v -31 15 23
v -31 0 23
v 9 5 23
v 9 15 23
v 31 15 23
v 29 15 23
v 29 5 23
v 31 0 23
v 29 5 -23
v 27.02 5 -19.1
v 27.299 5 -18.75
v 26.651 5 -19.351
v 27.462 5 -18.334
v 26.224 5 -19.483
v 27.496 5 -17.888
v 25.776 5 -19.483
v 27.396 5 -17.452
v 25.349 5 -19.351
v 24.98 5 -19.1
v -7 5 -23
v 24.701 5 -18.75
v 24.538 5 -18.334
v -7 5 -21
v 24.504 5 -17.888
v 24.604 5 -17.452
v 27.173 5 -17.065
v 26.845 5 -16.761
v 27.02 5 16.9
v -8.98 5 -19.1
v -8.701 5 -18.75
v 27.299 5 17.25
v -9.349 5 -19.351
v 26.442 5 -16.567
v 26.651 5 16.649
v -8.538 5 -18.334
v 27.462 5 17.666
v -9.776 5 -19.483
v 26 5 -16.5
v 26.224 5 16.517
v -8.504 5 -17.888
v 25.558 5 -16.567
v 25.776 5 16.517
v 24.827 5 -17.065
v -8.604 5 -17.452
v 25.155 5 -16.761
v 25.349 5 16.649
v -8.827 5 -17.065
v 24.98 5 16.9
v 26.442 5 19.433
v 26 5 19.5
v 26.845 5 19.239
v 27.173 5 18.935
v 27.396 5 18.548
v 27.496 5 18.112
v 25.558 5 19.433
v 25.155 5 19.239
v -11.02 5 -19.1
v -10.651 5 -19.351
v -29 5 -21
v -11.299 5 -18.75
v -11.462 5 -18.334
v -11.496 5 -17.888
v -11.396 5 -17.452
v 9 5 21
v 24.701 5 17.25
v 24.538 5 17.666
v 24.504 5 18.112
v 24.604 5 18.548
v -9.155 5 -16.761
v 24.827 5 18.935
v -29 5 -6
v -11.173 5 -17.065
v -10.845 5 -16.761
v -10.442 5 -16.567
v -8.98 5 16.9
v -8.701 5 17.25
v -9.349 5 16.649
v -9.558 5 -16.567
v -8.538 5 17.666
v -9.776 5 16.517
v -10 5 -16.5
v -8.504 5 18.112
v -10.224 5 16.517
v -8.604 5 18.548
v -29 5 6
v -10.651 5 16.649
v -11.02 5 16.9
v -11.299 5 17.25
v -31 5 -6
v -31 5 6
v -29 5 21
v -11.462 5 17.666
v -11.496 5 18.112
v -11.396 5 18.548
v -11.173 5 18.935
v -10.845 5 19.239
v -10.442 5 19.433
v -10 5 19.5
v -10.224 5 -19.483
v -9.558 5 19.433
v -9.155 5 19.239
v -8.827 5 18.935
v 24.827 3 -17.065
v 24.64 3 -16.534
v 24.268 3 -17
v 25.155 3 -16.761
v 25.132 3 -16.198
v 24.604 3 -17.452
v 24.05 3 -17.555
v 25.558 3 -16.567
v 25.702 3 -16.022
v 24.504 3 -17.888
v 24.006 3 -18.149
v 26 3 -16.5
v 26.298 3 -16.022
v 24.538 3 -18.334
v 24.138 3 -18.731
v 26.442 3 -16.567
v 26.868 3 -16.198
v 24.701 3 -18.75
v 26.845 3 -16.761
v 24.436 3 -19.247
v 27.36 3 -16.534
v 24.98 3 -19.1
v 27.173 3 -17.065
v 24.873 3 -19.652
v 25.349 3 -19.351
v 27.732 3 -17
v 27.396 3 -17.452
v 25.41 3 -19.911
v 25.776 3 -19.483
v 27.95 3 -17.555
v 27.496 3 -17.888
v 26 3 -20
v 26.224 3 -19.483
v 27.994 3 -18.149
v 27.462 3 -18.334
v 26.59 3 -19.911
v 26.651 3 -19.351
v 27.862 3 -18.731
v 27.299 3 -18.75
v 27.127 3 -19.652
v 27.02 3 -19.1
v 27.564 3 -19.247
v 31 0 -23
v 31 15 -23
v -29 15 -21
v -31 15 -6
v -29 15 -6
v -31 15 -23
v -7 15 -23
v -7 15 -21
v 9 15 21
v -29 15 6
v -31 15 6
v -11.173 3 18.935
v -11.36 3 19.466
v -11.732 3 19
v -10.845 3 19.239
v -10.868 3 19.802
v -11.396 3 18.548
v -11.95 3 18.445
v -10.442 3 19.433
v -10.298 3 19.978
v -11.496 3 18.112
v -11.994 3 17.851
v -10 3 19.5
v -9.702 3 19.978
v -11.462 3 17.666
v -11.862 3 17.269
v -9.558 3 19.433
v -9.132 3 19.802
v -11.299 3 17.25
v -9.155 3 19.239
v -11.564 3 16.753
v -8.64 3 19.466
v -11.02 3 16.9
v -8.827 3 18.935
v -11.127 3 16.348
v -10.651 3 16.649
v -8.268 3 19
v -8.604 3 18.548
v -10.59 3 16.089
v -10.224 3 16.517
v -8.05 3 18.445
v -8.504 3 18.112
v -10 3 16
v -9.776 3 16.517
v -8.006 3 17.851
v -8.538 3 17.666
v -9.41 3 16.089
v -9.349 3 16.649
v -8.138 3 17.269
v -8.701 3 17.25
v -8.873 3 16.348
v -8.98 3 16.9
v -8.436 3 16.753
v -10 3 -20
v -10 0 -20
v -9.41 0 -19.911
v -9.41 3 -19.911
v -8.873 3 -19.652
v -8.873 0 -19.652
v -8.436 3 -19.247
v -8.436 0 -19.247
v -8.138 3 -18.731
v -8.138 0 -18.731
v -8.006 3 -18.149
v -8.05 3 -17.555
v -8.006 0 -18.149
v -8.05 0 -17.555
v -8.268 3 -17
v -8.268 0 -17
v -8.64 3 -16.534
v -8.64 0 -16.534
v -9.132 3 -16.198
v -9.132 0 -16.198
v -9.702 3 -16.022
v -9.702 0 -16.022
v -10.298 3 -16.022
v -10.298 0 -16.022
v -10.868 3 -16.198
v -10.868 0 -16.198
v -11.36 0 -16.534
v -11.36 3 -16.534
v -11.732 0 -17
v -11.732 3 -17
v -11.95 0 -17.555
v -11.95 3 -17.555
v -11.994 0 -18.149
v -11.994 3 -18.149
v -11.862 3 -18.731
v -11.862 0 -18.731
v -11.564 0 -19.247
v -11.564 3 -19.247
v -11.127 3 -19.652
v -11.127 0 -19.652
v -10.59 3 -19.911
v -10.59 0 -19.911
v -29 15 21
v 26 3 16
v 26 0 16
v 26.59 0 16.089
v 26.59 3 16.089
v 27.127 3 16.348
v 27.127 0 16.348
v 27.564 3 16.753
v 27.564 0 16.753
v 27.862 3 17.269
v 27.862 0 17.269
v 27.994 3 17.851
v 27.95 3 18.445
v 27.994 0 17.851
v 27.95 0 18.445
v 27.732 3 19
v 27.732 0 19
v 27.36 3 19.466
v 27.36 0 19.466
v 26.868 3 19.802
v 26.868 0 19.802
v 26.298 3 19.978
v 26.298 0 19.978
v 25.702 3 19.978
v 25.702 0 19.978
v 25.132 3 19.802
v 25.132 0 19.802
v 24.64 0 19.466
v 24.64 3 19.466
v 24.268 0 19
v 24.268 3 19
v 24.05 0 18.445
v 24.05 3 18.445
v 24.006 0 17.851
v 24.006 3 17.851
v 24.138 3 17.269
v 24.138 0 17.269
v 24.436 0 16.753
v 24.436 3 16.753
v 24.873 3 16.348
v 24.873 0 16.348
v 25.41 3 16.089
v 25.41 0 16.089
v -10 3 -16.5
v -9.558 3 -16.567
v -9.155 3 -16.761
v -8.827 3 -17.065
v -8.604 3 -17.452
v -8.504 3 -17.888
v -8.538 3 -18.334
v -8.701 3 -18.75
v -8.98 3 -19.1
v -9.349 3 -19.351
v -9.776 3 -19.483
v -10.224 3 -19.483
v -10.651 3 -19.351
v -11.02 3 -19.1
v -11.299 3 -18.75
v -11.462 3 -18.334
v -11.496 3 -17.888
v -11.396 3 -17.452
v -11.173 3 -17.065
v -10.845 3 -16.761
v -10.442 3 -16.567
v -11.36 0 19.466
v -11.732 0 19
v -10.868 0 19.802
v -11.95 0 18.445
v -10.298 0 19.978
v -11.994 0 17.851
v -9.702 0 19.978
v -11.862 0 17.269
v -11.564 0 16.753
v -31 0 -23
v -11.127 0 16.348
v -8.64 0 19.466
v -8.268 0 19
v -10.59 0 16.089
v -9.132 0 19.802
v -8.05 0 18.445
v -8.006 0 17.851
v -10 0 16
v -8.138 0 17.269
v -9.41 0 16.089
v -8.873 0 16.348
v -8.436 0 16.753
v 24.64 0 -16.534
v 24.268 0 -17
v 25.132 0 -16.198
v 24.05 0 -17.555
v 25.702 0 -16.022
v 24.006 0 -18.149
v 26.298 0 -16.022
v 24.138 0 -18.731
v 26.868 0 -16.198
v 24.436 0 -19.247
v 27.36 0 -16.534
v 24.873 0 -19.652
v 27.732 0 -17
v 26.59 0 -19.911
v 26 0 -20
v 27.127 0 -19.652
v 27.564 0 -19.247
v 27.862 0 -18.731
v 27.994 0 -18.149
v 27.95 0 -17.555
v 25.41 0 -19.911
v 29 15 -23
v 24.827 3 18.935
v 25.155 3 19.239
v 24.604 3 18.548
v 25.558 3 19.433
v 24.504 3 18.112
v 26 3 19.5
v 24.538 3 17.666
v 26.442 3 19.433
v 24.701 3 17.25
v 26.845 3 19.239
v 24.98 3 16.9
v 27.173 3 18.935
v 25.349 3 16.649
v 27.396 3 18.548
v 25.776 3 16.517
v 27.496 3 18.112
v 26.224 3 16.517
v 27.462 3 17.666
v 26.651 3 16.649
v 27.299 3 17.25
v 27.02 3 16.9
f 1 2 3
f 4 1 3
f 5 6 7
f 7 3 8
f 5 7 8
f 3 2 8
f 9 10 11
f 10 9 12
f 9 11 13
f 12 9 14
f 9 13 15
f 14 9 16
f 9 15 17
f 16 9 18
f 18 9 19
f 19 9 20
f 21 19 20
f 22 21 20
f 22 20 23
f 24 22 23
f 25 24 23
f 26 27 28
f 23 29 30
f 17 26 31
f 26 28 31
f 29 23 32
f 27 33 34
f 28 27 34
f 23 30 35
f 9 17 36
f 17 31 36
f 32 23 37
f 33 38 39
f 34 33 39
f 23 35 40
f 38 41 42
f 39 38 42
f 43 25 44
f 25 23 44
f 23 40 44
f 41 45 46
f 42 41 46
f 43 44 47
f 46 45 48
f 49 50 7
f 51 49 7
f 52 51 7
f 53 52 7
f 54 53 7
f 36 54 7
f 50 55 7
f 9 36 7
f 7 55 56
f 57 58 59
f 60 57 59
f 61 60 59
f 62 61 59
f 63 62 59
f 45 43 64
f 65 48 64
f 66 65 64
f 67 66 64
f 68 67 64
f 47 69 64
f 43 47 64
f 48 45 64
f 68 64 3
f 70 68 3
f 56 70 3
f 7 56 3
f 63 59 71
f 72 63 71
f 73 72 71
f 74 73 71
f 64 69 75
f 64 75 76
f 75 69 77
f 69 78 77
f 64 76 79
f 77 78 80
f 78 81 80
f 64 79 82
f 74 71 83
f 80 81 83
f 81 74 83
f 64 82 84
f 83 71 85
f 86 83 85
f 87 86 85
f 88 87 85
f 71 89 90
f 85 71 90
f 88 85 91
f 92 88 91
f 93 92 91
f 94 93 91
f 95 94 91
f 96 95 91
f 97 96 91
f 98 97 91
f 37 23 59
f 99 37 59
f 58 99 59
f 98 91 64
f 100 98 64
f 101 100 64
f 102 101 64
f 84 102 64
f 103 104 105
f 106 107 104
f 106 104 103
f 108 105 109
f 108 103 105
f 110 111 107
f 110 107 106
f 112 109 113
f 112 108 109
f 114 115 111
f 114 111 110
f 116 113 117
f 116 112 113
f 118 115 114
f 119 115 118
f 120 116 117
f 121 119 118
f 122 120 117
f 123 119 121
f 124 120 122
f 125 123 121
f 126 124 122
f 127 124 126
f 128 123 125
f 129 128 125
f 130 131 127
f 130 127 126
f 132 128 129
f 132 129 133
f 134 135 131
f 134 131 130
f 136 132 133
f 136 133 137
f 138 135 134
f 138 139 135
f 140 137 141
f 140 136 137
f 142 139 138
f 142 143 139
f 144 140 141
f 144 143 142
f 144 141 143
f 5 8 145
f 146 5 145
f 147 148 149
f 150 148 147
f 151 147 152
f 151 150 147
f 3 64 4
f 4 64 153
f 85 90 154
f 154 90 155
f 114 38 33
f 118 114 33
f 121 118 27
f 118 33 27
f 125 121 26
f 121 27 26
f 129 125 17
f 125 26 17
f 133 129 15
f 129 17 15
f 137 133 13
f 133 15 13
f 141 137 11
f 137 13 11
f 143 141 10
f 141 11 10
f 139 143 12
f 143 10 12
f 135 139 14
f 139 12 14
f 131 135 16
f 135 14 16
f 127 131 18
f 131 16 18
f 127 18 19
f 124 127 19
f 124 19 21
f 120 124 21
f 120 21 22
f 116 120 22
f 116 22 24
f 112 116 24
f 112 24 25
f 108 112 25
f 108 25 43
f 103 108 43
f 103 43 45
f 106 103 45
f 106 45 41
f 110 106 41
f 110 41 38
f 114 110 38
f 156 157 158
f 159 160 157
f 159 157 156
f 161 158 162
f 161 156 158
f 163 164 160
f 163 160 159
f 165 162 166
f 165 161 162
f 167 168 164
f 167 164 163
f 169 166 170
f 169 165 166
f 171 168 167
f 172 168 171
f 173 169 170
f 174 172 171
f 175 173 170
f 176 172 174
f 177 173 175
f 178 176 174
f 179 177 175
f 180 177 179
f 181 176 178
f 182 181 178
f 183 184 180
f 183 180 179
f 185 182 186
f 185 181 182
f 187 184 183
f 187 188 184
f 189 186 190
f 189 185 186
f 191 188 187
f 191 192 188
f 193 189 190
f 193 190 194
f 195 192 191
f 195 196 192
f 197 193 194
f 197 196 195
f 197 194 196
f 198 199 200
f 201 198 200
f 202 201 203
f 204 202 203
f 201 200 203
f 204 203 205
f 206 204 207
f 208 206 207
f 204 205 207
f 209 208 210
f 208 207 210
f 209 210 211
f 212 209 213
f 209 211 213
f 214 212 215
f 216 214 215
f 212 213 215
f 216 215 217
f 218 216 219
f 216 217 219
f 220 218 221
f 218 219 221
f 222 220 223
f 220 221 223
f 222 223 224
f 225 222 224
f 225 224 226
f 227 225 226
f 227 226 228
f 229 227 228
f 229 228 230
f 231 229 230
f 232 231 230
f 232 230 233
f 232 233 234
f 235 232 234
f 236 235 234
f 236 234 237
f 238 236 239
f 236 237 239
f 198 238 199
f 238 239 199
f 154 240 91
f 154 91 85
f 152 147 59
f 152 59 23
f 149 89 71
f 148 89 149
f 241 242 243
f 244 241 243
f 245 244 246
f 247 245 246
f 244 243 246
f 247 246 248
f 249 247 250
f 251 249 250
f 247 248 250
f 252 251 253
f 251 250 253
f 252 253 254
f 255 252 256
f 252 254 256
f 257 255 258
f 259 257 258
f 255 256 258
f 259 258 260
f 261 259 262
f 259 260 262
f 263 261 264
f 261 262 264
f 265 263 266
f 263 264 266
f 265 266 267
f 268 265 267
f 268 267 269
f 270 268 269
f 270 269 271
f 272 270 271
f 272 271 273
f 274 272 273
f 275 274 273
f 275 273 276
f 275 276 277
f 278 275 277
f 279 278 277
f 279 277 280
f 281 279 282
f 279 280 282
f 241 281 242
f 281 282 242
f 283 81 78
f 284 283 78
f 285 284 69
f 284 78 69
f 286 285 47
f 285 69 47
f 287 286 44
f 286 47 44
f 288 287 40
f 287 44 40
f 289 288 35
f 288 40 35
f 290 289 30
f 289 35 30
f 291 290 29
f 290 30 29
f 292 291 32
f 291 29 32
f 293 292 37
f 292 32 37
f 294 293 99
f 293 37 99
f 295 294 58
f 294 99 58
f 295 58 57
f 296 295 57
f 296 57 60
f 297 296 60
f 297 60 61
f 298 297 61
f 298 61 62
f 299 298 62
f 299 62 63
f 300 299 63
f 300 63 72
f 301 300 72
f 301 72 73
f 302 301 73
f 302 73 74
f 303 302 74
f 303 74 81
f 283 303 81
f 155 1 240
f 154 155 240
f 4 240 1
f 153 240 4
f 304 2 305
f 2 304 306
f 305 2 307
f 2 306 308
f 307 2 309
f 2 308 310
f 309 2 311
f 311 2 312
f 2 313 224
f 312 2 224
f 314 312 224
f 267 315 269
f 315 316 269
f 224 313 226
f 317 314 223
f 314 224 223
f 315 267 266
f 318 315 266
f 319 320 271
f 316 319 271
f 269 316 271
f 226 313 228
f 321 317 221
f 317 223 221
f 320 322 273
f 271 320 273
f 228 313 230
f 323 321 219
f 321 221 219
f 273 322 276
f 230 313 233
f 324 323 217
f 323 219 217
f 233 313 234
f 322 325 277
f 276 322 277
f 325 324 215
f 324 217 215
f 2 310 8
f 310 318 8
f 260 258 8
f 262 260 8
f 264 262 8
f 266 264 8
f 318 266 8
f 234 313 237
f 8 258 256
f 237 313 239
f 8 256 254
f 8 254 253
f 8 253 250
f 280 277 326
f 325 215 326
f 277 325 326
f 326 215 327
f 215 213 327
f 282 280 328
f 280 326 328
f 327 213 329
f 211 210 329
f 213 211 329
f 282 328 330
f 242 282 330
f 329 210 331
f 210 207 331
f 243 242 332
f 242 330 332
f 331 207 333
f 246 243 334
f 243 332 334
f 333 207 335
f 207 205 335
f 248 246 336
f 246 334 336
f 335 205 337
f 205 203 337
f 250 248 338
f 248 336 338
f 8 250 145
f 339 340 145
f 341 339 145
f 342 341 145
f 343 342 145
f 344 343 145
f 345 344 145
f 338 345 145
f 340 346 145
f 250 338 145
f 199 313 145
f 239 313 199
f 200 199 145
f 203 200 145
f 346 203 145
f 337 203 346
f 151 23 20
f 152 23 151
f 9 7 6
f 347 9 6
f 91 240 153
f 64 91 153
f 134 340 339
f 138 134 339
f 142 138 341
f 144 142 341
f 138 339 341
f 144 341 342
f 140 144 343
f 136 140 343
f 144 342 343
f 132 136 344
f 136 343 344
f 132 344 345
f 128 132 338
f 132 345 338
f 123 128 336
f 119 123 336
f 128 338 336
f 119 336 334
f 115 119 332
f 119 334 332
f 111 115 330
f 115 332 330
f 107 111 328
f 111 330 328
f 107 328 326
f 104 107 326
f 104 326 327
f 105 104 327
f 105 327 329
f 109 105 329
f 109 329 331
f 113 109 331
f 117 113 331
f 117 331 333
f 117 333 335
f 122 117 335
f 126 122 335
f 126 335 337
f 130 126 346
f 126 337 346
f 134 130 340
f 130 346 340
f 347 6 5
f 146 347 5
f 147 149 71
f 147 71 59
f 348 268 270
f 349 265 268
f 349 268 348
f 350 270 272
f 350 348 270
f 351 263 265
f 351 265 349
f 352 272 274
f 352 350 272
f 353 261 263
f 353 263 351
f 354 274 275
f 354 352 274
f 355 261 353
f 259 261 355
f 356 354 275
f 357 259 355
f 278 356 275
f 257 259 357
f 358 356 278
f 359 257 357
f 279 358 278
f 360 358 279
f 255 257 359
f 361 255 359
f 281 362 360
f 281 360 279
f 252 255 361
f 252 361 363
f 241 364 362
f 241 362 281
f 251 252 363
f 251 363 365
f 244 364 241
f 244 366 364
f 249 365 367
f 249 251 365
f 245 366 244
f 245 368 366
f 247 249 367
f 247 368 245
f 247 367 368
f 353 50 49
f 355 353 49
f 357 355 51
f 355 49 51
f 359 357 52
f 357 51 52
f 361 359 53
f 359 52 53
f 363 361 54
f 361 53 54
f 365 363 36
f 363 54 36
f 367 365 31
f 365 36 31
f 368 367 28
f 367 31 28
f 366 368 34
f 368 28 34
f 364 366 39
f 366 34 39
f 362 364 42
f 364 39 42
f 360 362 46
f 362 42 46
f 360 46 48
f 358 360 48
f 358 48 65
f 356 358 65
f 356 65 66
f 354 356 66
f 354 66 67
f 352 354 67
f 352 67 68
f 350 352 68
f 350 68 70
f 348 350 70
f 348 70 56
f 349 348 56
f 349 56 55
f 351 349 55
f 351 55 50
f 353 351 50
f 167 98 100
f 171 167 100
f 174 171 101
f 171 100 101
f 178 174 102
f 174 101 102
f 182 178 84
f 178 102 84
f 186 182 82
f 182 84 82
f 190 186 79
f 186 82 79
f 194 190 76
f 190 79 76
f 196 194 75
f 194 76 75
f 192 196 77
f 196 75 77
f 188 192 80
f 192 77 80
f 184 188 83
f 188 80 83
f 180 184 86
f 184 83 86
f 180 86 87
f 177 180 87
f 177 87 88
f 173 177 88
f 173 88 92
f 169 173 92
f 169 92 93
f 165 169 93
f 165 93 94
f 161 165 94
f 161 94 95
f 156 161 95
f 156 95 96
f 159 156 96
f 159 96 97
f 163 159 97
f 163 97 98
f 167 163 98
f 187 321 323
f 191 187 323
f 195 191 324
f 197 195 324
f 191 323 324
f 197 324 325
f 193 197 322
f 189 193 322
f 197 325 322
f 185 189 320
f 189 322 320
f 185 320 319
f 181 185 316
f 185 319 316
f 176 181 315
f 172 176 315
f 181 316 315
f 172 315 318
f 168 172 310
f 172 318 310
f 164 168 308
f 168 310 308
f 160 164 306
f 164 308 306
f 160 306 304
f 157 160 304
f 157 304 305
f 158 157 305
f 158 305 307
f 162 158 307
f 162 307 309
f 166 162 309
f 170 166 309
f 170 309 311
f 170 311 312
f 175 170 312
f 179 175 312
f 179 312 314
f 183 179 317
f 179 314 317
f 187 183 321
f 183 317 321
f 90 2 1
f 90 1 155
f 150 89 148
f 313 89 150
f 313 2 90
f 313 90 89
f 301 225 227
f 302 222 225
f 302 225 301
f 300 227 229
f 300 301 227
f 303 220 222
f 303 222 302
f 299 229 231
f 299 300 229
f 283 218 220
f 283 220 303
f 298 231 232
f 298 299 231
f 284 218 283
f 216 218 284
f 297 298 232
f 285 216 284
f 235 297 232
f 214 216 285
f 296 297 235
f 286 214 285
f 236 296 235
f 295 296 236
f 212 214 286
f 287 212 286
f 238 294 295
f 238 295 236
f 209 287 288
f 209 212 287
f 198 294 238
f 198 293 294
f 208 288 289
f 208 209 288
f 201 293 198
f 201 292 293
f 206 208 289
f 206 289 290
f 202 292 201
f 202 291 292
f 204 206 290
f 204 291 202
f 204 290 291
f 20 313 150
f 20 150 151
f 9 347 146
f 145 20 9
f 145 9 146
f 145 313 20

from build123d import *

# Parameters (mm, degrees)
SKETCH_1_W          = 62
SKETCH_1_H          = 46
EXTRUDE_1_DEPTH     = 15
SKETCH_2_W          = 58
SKETCH_2_H          = 42
CUT_EXTRUDE_1_DEPTH = 10
CUT_EXTRUDE_2_REACH = 69.809
SKETCH_3_W          = 12
SKETCH_3_H          = 20
CUT_EXTRUDE_3_REACH = 57.875
SKETCH_5_W          = 36
SKETCH_5_H          = 10
CUT_EXTRUDE_4_REACH = 57.875
SKETCH_6_W          = 20
SKETCH_6_H          = 10
SKETCH_7_R          = 1.5
CUT_EXTRUDE_5_DEPTH = 40.874804075
SKETCH_8_R          = 2
CUT_EXTRUDE_6_DEPTH = 3


with BuildPart() as part:
    # 草图1 → 凸台-拉伸1 (new body)
    with BuildSketch(Plane(origin=(0, 0, 0), x_dir=(1, 0, 0), z_dir=(0, 1, 0))):
        Rectangle(SKETCH_1_W, SKETCH_1_H)
    extrude(amount=EXTRUDE_1_DEPTH)

    # 草图2 → 切除-拉伸1 (cut)
    with BuildSketch(Plane(origin=(0, 15, 0), x_dir=(1, 0, 0), z_dir=(0, 1, 0))):
        Rectangle(SKETCH_2_W, SKETCH_2_H)
    extrude(amount=-CUT_EXTRUDE_1_DEPTH, mode=Mode.SUBTRACT)

    # 草图3 → 切除-拉伸2 (cut, up to next)
    with BuildSketch(Plane.ZY.offset(31), mode=Mode.PRIVATE) as cut_extrude_2_sk1:
        with Locations((0, 15)):
            Rectangle(SKETCH_3_W, SKETCH_3_H)
    cut_extrude_2_tool1 = extrude(cut_extrude_2_sk1.sketch, amount=-CUT_EXTRUDE_2_REACH, mode=Mode.PRIVATE) & part.part
    add(cut_extrude_2_tool1.solids().sort_by_distance((-31, 15, 0))[0], mode=Mode.SUBTRACT)

    # 草图5 → 切除-拉伸3 (cut, up to next)
    with BuildSketch(Plane.XY.offset(-21), mode=Mode.PRIVATE) as cut_extrude_3_sk1:
        with Locations((11, 10)):
            Rectangle(SKETCH_5_W, SKETCH_5_H)
    cut_extrude_3_tool1 = extrude(cut_extrude_3_sk1.sketch, amount=-CUT_EXTRUDE_3_REACH, mode=Mode.PRIVATE) & part.part
    add(cut_extrude_3_tool1.solids().sort_by_distance((11, 10, -21))[0], mode=Mode.SUBTRACT)

    # 草图6 → 切除-拉伸4 (cut, up to next)
    with BuildSketch(Plane(origin=(0, 0, 21), x_dir=(-1, 0, 0), z_dir=(0, 0, -1)), mode=Mode.PRIVATE) as cut_extrude_4_sk1:
        with Locations((-19, 10)):
            Rectangle(SKETCH_6_W, SKETCH_6_H)
    cut_extrude_4_tool1 = extrude(cut_extrude_4_sk1.sketch, amount=-CUT_EXTRUDE_4_REACH, mode=Mode.PRIVATE) & part.part
    add(cut_extrude_4_tool1.solids().sort_by_distance((19, 10, 21))[0], mode=Mode.SUBTRACT)

    # 草图7 → 切除-拉伸5 (cut, through all)
    with BuildSketch(Plane(origin=(0, 5, 0), x_dir=(1, 0, 0), z_dir=(0, 1, 0))):
        with Locations(Location((26, -18, 0), (0, 0, 270))):
            Circle(SKETCH_7_R)
        with Locations(Location((26, 18, 0), (0, 0, 270))):
            Circle(SKETCH_7_R)
        with Locations(Location((-10, 18, 0), (0, 0, 270))):
            Circle(SKETCH_7_R)
        with Locations(Location((-10, -18, 0), (0, 0, 270))):
            Circle(SKETCH_7_R)
    extrude(amount=-CUT_EXTRUDE_5_DEPTH, mode=Mode.SUBTRACT)

    # 草图8 → 切除-拉伸6 (cut)
    with BuildSketch(Plane.XZ):
        with Locations(Location((-10, 18, 0), (0, 0, 270))):
            Circle(SKETCH_8_R)
        with Locations(Location((26, 18, 0), (0, 0, 270))):
            Circle(SKETCH_8_R)
        with Locations(Location((26, -18, 0), (0, 0, 270))):
            Circle(SKETCH_8_R)
        with Locations(Location((-10, -18, 0), (0, 0, 270))):
            Circle(SKETCH_8_R)
    extrude(amount=-CUT_EXTRUDE_6_DEPTH, mode=Mode.SUBTRACT)


solid = part.part
